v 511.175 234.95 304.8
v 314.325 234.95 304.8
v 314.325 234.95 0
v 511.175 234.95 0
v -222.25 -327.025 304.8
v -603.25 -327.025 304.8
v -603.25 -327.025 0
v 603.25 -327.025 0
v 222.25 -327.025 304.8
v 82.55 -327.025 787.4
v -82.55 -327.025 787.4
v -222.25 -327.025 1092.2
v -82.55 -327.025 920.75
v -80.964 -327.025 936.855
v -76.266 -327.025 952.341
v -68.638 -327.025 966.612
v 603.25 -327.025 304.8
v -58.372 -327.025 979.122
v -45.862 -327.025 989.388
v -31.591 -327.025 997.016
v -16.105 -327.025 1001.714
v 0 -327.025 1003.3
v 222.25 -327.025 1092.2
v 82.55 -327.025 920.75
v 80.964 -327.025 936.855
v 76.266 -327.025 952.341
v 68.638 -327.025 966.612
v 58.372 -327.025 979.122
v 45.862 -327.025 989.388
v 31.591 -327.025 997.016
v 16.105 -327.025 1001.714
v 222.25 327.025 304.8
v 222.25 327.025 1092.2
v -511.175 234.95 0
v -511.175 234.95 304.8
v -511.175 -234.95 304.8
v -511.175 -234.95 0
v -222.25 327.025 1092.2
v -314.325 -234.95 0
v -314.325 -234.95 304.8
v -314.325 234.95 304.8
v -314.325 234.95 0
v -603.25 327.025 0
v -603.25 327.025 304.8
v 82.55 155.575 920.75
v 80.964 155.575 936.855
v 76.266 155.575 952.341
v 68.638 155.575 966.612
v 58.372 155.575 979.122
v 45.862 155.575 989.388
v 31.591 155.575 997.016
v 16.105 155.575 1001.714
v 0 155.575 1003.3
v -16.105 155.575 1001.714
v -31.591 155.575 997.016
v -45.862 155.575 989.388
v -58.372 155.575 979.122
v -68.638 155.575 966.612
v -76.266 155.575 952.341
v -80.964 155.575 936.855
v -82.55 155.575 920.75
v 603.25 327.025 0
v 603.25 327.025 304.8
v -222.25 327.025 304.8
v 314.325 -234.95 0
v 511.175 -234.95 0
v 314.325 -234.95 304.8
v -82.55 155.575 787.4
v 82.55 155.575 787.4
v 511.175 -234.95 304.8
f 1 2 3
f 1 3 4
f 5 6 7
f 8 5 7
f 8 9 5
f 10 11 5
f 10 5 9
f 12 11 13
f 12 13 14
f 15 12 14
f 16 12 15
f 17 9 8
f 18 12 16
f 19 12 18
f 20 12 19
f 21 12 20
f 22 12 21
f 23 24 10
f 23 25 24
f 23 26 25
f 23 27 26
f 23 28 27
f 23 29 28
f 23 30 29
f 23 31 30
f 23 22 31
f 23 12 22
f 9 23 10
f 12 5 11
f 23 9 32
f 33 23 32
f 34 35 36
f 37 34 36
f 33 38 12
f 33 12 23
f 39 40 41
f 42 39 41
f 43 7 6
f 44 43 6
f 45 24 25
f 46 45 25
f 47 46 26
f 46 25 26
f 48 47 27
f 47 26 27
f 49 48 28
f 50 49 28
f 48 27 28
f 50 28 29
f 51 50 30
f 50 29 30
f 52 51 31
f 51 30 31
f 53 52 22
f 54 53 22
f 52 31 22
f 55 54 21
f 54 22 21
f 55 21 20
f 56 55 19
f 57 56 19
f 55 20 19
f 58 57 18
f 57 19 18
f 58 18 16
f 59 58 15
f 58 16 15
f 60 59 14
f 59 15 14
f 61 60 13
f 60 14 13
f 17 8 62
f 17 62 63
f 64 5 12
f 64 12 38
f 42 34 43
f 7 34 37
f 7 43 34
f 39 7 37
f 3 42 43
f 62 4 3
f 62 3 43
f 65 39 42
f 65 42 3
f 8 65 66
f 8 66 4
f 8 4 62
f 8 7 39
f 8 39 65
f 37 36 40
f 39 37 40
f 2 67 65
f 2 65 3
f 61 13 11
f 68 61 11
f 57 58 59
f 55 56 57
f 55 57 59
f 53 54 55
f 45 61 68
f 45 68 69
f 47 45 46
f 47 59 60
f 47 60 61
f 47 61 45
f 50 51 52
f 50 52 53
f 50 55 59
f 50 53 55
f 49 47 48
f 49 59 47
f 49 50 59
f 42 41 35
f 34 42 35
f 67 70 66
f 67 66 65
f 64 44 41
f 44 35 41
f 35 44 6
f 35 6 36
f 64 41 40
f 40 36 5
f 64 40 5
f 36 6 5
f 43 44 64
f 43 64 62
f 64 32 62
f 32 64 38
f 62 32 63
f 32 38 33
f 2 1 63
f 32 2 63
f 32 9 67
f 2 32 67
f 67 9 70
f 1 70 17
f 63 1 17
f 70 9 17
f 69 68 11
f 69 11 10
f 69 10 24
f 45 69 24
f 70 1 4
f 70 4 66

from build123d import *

# Parameters (mm, degrees)
F0_W     = 444.5
F0_H     = 654.05
F1_DEPTH = 1092.2
F2_W     = 381
F2_H     = 304.8
F3_DEPTH = 654.05
F5_DEPTH = 304.801
F7_DEPTH = 482.6


# Not quite as in the source:
# - a pattern or mirror of a feature is missing from the dataset's text; its kind, count and spacing are read off the source's solid


with BuildPart() as f1:
    # F0 (on Top) → F1 (new body)
    with BuildSketch(Plane.XY):
        Rectangle(F0_W, F0_H)
    extrude(amount=F1_DEPTH)

    # F2 (on face) → F3 (join, through all)
    with BuildSketch(Plane.XZ.offset(327.025)):
        with Locations((412.75, 152.4)):
            Rectangle(F2_W, F2_H)
        with Locations((-412.75, 152.4)):
            Rectangle(F2_W, F2_H)
    extrude(amount=-F3_DEPTH)

    # F4 (on face) → F5 (cut, through all)
    with BuildSketch(Plane.XY.offset(304.8)):
        Polygon((-314.325, -234.95), (-314.325, 168.9629166667), (-511.175, -168.9629166667), (-511.175, -234.95), align=None)
        Polygon((-511.175, -168.9629166667), (-314.325, 168.9629166667), (-314.325, 234.95), (-511.175, 234.95), align=None)
    f5 = extrude(amount=-F5_DEPTH, mode=Mode.SUBTRACT)

    # F5_copies: F5 across plane
    add(f5.mirror(Plane(origin=(0, 0, 0), x_dir=(0, 0, 1), z_dir=(1, 0, 0))), mode=Mode.SUBTRACT)

    # F6 (on face) → F7 (cut)
    with BuildSketch(Plane.XZ.offset(327.025)):
        with BuildLine():
            ThreePointArc((82.55, 920.75), (58.3716647869, 979.121664787), (0, 1003.3))
            Line((0, 1003.3), (0, 920.75))
            Line((0, 920.75), (82.55, 920.75))
        make_face()
        with BuildLine():
            Line((0, 920.75), (0, 1003.3))
            ThreePointArc((0, 1003.3), (-58.371664787, 979.1216647869), (-82.55, 920.75))
            Line((-82.55, 920.75), (0, 920.75))
        make_face()
        with BuildLine():
            Line((82.55, 920.75), (0, 920.75))
            Line((0, 920.75), (0, 838.2))
            ThreePointArc((0, 838.2), (58.3716647869, 862.378335213), (82.55, 920.75))
        make_face()
        with BuildLine():
            Line((0, 838.2), (0, 920.75))
            Line((0, 920.75), (-82.55, 920.75))
            ThreePointArc((-82.55, 920.75), (-58.371664787, 862.3783352131), (0, 838.2))
        make_face()
        with BuildLine():
            Line((82.55, 787.4), (82.55, 920.75))
            ThreePointArc((82.55, 920.75), (58.3716647869, 862.378335213), (0, 838.2))
            Line((0, 838.2), (0, 787.4))
            Line((0, 787.4), (82.55, 787.4))
        make_face()
        with BuildLine():
            ThreePointArc((0, 838.2), (-58.371664787, 862.3783352131), (-82.55, 920.75))
            Line((-82.55, 920.75), (-82.55, 787.4))
            Line((-82.55, 787.4), (0, 787.4))
            Line((0, 787.4), (0, 838.2))
        make_face()
    extrude(amount=-F7_DEPTH, mode=Mode.SUBTRACT)


solid = f1.part
